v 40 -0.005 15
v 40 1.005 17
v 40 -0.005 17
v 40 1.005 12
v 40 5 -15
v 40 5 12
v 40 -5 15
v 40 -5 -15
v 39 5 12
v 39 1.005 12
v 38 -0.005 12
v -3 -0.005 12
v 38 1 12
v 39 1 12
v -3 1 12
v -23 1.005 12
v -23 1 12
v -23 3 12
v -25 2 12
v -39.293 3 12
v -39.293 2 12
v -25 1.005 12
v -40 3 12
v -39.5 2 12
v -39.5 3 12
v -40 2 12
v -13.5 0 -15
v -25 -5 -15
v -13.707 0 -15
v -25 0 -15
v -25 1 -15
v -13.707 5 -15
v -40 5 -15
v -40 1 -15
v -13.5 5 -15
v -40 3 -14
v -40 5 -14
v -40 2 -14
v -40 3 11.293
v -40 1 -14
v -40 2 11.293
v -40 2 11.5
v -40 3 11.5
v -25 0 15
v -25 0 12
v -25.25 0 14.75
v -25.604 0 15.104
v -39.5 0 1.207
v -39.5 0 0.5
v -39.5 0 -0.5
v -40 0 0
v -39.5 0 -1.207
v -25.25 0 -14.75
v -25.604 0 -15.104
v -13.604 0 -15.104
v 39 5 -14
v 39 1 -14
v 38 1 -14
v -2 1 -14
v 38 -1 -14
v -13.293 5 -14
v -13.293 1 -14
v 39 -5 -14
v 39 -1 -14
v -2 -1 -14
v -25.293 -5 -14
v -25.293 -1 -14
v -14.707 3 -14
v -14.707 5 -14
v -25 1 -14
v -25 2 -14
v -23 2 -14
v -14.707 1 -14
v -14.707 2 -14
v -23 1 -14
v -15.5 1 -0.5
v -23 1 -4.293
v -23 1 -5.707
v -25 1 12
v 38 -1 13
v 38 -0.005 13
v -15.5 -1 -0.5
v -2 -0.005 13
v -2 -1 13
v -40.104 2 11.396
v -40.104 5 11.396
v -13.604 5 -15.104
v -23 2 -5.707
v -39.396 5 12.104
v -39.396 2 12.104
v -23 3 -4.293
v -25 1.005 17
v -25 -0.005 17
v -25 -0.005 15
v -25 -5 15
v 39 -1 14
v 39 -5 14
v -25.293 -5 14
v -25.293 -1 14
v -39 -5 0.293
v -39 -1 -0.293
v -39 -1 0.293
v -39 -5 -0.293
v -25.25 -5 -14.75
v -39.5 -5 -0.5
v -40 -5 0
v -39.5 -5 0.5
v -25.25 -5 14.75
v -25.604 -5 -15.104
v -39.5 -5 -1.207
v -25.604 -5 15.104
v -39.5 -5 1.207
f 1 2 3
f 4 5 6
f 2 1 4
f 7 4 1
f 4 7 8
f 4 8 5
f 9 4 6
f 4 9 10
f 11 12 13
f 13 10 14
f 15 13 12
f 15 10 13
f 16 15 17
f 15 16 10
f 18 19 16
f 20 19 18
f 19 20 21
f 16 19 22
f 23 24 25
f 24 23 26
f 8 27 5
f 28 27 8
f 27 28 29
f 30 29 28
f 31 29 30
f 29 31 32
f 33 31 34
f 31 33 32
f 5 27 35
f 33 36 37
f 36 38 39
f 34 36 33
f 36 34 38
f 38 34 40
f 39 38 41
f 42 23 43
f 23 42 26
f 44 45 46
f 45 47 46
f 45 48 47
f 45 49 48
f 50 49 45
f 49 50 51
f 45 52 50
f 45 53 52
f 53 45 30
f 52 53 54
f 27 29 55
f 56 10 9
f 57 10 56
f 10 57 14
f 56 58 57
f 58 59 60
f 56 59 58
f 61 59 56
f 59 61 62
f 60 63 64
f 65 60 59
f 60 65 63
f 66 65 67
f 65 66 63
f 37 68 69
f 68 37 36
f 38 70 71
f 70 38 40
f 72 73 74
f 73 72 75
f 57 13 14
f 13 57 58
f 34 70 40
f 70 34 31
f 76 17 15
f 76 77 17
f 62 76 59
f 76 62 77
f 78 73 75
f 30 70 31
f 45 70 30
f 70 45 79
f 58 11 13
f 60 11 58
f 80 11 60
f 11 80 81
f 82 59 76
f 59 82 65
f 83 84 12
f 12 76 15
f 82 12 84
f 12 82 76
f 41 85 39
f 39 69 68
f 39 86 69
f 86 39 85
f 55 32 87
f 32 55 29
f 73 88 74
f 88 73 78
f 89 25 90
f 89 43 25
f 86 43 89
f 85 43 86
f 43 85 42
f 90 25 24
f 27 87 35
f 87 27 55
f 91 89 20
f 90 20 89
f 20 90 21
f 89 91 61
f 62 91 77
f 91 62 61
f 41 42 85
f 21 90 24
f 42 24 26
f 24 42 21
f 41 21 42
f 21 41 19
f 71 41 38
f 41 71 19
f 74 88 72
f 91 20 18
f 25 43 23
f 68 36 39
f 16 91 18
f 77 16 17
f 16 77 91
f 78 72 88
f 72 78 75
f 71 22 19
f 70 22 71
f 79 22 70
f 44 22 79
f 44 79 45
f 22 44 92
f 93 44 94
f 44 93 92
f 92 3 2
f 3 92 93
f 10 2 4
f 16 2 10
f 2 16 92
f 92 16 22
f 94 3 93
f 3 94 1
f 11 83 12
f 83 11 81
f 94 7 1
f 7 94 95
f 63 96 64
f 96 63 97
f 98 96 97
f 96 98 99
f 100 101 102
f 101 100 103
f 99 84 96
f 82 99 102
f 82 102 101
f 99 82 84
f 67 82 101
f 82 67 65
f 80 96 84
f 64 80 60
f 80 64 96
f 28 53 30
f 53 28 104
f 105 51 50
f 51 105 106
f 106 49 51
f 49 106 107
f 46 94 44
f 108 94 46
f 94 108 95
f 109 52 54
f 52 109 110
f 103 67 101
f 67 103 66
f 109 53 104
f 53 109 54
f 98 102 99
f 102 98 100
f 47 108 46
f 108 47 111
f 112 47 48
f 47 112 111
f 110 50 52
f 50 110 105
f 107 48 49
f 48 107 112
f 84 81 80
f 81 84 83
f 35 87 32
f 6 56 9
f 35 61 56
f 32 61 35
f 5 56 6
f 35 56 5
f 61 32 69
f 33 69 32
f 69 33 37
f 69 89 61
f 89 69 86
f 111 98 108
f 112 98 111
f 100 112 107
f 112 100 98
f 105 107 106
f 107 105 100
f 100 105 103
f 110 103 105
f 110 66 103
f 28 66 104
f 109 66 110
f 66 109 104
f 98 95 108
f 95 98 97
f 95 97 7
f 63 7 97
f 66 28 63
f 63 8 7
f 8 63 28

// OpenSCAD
// file: outlet.scad
module outlet()
{
    ringHeight=10;
    outerD=54.8;
    thickness=1;
    innerD=outerD-2*thickness;

    notchX=6;
    notchY=1;
    notchz=1.6;
    notchOffset=0;
    
    
    difference()
    {
        cylinder(h=ringHeight,d=outerD,center=true, $fn=128);
        cylinder(h=ringHeight,d=innerD,center=true, $fn=128);       
    }
    translate([0,outerD/2-thickness/2,notchOffset])cube([notchX,thickness,notchz],center=true);
    translate([0,outerD/2+notchY/2,notchOffset])cube([notchX,notchY,notchz],center=true);

    translate([0,-outerD/2+thickness/2,notchOffset])cube([notchX,thickness,notchz],center=true);
    translate([0,-outerD/2-notchY/2,notchOffset])cube([notchX,notchY,notchz],center=true);
}



outlet();
// main file
use <outlet.scad>

    lip=5;
    thickness=1;
     height=27;



 
module right_angle_prism(l, w, h) {
    linear_extrude(height = h) {
        polygon(points=[[0,0],[l,0],[0,w]], paths=[[0,1,2]]);
    }
}




module controller(
    depth=65

)
{
    
    width=70;
    tabWidth=15;
    tabThick=2;
    

    difference() 
    {
        union()
        {
            cube([depth,width,height],center=true);
        }
        translate([-thickness,0,thickness])cube([depth,width-2*thickness,height],center=true);
        translate([-depth/2+tabWidth/2,-width/2,0])cube([tabWidth,tabThick,height+lip*2],center=true);

        // outlet
        //translate([0,-width/2,0])cube([depth,width,height-2*thickness],center=true);

        inX=depth/2;
        inZ=height;
        translate([inX/2-2*thickness,-width/2,-height/2+inZ/2+thickness])cube([inX,width,inZ],center=true);

        translate([-2*thickness,-width/2,-height/2+inZ/2+thickness])rotate([0,45,0])cube([inZ*sqrt(2)/2,width,inZ*sqrt(2)/2],center=true);
        


        //translate([-2*thickness,length/2,-height/2+inZ/2+thickness])rotate([0,45,0])cube([inZ*sqrt(2)/2,length,inZ*sqrt(2)/2],center=true);
    }


    //back wall at 45 angle
    angleRight=(height-thickness/2);
    angleSide=angleRight*sqrt(2);
    
    // Hacks to provide space for the tab
    translate([-depth/2,-width/2+tabThick+thickness,-height/2])rotate([90,0,0])right_angle_prism(height,height, thickness);
    translate([-depth/2+tabWidth/2+thickness,-width/2+tabThick+thickness/2,0])cube([tabWidth+2*thickness,thickness,height],center=true);
    translate([-depth/2+tabWidth+tabThick/2,-width/2+tabThick,0])cube([tabThick,tabThick,height],center=true);
    
    // Sloping plane at top
    difference()
    {
        translate([(height)/2-depth/2,0,0])rotate([0,-45,0])cube([thickness,width,angleSide],center=true);
        translate([-depth/2+tabWidth/2,-width/2+tabThick/2,0])cube([tabWidth+thickness,tabThick,height+lip*2],center=true);       
    }


    //lips
    translate([tabWidth/2,-width/2+thickness/2,height/2+lip/2])cube([depth-tabWidth,thickness+0.01,lip],center=true);
    translate([0,width/2-thickness/2,height/2+lip/2])cube([depth,thickness,lip],center=true);

    
    
}

module ductNoholes(length=20,ductHeight=27,ductDepth=65)
{
    angleRight=(ductHeight-thickness/2);
    angleSide=angleRight*sqrt(2);

    difference() 
    {
        
        cube([ductDepth,length,ductHeight],center=true);  
        cube([ductDepth-2*thickness,length-2*thickness,ductHeight-2*thickness],center=true);

        //back wall at 45 angle
      translate([-ductDepth/2-ductHeight/2,length/2,-ductHeight/2])rotate([90,0,0])right_angle_prism(ductHeight,ductHeight, length);
    translate([-ductDepth/2-ductHeight/2,length/2,ductHeight/2])rotate([90,90,0])right_angle_prism(ductHeight,ductHeight, length);
 
  }
   
        


   difference()
   {
        union()
        {
            translate([-ductDepth/2,0,0])rotate([0,-45,0])cube([thickness,length,angleSide],center=true);
            translate([-ductDepth/2,0,0])rotate([0,45,0])cube([thickness,length,angleSide],center=true);
        }
        
   translate([-ductDepth/2-angleRight/4+thickness/2,0,0])cube([angleRight/2,length,ductHeight+thickness],center=true);
   translate([-ductDepth/2-angleRight/4-thickness,0,0])cube([angleRight/2,length,ductHeight+thickness],center=true);
   }
    
}

module duct(
    length=20,
    ductHeight=27,
    outX=30,
    outZ=0,
    ductDepth=65,
    )
{
    // Use a function call to get this number later
    outletD=52.8;
    
    
    difference()
    {
        ductNoholes(length,ductHeight,ductDepth);
        //translate([ductHeight/2,2*thickness,-ductHeight/2+height/2+thickness])cube([ductDepth-ductHeight-2*thickness,length,height],center=true);
        inX=ductDepth/2;
        inZ=height;
        translate([inX/2-2*thickness,length/2,-ductHeight/2+inZ/2+thickness])cube([inX,length,inZ],center=true);
        
        translate([-2*thickness,length/2,-ductHeight/2+inZ/2+thickness])rotate([0,45,0])cube([inZ*sqrt(2)/2,length,inZ*sqrt(2)/2],center=true);
        
        //outlet
        translate([outX,-length/2,outZ])rotate([90,0,0])cylinder(h=length,d=outletD,center=true, $fn=128);
    }
    

}


module fanDuct(
    dL=50,
    dH=80,
    dD=110,
)
{
union()
{
    outletH=10;
    // Use a function call to get this number later
    OutletD=52.8;
    outX=dD/2-OutletD/2-2;
    translate([0,35,27/2-dH/2])controller(depth=dD);
    translate([0,-dL/2,0])duct(length=dL,ductHeight=dH,ductDepth=dD,outX=outX);
    //translate([outX,-(dL+outletH/2),0])rotate([90,90,0])outlet();
}

}


difference()
{
    fanDuct(dH=30,dD=80);
    translate([0,105,0])cube([200,200,200],center=true);
    translate([0,-105,0])cube([200,200,200],center=true);
}
